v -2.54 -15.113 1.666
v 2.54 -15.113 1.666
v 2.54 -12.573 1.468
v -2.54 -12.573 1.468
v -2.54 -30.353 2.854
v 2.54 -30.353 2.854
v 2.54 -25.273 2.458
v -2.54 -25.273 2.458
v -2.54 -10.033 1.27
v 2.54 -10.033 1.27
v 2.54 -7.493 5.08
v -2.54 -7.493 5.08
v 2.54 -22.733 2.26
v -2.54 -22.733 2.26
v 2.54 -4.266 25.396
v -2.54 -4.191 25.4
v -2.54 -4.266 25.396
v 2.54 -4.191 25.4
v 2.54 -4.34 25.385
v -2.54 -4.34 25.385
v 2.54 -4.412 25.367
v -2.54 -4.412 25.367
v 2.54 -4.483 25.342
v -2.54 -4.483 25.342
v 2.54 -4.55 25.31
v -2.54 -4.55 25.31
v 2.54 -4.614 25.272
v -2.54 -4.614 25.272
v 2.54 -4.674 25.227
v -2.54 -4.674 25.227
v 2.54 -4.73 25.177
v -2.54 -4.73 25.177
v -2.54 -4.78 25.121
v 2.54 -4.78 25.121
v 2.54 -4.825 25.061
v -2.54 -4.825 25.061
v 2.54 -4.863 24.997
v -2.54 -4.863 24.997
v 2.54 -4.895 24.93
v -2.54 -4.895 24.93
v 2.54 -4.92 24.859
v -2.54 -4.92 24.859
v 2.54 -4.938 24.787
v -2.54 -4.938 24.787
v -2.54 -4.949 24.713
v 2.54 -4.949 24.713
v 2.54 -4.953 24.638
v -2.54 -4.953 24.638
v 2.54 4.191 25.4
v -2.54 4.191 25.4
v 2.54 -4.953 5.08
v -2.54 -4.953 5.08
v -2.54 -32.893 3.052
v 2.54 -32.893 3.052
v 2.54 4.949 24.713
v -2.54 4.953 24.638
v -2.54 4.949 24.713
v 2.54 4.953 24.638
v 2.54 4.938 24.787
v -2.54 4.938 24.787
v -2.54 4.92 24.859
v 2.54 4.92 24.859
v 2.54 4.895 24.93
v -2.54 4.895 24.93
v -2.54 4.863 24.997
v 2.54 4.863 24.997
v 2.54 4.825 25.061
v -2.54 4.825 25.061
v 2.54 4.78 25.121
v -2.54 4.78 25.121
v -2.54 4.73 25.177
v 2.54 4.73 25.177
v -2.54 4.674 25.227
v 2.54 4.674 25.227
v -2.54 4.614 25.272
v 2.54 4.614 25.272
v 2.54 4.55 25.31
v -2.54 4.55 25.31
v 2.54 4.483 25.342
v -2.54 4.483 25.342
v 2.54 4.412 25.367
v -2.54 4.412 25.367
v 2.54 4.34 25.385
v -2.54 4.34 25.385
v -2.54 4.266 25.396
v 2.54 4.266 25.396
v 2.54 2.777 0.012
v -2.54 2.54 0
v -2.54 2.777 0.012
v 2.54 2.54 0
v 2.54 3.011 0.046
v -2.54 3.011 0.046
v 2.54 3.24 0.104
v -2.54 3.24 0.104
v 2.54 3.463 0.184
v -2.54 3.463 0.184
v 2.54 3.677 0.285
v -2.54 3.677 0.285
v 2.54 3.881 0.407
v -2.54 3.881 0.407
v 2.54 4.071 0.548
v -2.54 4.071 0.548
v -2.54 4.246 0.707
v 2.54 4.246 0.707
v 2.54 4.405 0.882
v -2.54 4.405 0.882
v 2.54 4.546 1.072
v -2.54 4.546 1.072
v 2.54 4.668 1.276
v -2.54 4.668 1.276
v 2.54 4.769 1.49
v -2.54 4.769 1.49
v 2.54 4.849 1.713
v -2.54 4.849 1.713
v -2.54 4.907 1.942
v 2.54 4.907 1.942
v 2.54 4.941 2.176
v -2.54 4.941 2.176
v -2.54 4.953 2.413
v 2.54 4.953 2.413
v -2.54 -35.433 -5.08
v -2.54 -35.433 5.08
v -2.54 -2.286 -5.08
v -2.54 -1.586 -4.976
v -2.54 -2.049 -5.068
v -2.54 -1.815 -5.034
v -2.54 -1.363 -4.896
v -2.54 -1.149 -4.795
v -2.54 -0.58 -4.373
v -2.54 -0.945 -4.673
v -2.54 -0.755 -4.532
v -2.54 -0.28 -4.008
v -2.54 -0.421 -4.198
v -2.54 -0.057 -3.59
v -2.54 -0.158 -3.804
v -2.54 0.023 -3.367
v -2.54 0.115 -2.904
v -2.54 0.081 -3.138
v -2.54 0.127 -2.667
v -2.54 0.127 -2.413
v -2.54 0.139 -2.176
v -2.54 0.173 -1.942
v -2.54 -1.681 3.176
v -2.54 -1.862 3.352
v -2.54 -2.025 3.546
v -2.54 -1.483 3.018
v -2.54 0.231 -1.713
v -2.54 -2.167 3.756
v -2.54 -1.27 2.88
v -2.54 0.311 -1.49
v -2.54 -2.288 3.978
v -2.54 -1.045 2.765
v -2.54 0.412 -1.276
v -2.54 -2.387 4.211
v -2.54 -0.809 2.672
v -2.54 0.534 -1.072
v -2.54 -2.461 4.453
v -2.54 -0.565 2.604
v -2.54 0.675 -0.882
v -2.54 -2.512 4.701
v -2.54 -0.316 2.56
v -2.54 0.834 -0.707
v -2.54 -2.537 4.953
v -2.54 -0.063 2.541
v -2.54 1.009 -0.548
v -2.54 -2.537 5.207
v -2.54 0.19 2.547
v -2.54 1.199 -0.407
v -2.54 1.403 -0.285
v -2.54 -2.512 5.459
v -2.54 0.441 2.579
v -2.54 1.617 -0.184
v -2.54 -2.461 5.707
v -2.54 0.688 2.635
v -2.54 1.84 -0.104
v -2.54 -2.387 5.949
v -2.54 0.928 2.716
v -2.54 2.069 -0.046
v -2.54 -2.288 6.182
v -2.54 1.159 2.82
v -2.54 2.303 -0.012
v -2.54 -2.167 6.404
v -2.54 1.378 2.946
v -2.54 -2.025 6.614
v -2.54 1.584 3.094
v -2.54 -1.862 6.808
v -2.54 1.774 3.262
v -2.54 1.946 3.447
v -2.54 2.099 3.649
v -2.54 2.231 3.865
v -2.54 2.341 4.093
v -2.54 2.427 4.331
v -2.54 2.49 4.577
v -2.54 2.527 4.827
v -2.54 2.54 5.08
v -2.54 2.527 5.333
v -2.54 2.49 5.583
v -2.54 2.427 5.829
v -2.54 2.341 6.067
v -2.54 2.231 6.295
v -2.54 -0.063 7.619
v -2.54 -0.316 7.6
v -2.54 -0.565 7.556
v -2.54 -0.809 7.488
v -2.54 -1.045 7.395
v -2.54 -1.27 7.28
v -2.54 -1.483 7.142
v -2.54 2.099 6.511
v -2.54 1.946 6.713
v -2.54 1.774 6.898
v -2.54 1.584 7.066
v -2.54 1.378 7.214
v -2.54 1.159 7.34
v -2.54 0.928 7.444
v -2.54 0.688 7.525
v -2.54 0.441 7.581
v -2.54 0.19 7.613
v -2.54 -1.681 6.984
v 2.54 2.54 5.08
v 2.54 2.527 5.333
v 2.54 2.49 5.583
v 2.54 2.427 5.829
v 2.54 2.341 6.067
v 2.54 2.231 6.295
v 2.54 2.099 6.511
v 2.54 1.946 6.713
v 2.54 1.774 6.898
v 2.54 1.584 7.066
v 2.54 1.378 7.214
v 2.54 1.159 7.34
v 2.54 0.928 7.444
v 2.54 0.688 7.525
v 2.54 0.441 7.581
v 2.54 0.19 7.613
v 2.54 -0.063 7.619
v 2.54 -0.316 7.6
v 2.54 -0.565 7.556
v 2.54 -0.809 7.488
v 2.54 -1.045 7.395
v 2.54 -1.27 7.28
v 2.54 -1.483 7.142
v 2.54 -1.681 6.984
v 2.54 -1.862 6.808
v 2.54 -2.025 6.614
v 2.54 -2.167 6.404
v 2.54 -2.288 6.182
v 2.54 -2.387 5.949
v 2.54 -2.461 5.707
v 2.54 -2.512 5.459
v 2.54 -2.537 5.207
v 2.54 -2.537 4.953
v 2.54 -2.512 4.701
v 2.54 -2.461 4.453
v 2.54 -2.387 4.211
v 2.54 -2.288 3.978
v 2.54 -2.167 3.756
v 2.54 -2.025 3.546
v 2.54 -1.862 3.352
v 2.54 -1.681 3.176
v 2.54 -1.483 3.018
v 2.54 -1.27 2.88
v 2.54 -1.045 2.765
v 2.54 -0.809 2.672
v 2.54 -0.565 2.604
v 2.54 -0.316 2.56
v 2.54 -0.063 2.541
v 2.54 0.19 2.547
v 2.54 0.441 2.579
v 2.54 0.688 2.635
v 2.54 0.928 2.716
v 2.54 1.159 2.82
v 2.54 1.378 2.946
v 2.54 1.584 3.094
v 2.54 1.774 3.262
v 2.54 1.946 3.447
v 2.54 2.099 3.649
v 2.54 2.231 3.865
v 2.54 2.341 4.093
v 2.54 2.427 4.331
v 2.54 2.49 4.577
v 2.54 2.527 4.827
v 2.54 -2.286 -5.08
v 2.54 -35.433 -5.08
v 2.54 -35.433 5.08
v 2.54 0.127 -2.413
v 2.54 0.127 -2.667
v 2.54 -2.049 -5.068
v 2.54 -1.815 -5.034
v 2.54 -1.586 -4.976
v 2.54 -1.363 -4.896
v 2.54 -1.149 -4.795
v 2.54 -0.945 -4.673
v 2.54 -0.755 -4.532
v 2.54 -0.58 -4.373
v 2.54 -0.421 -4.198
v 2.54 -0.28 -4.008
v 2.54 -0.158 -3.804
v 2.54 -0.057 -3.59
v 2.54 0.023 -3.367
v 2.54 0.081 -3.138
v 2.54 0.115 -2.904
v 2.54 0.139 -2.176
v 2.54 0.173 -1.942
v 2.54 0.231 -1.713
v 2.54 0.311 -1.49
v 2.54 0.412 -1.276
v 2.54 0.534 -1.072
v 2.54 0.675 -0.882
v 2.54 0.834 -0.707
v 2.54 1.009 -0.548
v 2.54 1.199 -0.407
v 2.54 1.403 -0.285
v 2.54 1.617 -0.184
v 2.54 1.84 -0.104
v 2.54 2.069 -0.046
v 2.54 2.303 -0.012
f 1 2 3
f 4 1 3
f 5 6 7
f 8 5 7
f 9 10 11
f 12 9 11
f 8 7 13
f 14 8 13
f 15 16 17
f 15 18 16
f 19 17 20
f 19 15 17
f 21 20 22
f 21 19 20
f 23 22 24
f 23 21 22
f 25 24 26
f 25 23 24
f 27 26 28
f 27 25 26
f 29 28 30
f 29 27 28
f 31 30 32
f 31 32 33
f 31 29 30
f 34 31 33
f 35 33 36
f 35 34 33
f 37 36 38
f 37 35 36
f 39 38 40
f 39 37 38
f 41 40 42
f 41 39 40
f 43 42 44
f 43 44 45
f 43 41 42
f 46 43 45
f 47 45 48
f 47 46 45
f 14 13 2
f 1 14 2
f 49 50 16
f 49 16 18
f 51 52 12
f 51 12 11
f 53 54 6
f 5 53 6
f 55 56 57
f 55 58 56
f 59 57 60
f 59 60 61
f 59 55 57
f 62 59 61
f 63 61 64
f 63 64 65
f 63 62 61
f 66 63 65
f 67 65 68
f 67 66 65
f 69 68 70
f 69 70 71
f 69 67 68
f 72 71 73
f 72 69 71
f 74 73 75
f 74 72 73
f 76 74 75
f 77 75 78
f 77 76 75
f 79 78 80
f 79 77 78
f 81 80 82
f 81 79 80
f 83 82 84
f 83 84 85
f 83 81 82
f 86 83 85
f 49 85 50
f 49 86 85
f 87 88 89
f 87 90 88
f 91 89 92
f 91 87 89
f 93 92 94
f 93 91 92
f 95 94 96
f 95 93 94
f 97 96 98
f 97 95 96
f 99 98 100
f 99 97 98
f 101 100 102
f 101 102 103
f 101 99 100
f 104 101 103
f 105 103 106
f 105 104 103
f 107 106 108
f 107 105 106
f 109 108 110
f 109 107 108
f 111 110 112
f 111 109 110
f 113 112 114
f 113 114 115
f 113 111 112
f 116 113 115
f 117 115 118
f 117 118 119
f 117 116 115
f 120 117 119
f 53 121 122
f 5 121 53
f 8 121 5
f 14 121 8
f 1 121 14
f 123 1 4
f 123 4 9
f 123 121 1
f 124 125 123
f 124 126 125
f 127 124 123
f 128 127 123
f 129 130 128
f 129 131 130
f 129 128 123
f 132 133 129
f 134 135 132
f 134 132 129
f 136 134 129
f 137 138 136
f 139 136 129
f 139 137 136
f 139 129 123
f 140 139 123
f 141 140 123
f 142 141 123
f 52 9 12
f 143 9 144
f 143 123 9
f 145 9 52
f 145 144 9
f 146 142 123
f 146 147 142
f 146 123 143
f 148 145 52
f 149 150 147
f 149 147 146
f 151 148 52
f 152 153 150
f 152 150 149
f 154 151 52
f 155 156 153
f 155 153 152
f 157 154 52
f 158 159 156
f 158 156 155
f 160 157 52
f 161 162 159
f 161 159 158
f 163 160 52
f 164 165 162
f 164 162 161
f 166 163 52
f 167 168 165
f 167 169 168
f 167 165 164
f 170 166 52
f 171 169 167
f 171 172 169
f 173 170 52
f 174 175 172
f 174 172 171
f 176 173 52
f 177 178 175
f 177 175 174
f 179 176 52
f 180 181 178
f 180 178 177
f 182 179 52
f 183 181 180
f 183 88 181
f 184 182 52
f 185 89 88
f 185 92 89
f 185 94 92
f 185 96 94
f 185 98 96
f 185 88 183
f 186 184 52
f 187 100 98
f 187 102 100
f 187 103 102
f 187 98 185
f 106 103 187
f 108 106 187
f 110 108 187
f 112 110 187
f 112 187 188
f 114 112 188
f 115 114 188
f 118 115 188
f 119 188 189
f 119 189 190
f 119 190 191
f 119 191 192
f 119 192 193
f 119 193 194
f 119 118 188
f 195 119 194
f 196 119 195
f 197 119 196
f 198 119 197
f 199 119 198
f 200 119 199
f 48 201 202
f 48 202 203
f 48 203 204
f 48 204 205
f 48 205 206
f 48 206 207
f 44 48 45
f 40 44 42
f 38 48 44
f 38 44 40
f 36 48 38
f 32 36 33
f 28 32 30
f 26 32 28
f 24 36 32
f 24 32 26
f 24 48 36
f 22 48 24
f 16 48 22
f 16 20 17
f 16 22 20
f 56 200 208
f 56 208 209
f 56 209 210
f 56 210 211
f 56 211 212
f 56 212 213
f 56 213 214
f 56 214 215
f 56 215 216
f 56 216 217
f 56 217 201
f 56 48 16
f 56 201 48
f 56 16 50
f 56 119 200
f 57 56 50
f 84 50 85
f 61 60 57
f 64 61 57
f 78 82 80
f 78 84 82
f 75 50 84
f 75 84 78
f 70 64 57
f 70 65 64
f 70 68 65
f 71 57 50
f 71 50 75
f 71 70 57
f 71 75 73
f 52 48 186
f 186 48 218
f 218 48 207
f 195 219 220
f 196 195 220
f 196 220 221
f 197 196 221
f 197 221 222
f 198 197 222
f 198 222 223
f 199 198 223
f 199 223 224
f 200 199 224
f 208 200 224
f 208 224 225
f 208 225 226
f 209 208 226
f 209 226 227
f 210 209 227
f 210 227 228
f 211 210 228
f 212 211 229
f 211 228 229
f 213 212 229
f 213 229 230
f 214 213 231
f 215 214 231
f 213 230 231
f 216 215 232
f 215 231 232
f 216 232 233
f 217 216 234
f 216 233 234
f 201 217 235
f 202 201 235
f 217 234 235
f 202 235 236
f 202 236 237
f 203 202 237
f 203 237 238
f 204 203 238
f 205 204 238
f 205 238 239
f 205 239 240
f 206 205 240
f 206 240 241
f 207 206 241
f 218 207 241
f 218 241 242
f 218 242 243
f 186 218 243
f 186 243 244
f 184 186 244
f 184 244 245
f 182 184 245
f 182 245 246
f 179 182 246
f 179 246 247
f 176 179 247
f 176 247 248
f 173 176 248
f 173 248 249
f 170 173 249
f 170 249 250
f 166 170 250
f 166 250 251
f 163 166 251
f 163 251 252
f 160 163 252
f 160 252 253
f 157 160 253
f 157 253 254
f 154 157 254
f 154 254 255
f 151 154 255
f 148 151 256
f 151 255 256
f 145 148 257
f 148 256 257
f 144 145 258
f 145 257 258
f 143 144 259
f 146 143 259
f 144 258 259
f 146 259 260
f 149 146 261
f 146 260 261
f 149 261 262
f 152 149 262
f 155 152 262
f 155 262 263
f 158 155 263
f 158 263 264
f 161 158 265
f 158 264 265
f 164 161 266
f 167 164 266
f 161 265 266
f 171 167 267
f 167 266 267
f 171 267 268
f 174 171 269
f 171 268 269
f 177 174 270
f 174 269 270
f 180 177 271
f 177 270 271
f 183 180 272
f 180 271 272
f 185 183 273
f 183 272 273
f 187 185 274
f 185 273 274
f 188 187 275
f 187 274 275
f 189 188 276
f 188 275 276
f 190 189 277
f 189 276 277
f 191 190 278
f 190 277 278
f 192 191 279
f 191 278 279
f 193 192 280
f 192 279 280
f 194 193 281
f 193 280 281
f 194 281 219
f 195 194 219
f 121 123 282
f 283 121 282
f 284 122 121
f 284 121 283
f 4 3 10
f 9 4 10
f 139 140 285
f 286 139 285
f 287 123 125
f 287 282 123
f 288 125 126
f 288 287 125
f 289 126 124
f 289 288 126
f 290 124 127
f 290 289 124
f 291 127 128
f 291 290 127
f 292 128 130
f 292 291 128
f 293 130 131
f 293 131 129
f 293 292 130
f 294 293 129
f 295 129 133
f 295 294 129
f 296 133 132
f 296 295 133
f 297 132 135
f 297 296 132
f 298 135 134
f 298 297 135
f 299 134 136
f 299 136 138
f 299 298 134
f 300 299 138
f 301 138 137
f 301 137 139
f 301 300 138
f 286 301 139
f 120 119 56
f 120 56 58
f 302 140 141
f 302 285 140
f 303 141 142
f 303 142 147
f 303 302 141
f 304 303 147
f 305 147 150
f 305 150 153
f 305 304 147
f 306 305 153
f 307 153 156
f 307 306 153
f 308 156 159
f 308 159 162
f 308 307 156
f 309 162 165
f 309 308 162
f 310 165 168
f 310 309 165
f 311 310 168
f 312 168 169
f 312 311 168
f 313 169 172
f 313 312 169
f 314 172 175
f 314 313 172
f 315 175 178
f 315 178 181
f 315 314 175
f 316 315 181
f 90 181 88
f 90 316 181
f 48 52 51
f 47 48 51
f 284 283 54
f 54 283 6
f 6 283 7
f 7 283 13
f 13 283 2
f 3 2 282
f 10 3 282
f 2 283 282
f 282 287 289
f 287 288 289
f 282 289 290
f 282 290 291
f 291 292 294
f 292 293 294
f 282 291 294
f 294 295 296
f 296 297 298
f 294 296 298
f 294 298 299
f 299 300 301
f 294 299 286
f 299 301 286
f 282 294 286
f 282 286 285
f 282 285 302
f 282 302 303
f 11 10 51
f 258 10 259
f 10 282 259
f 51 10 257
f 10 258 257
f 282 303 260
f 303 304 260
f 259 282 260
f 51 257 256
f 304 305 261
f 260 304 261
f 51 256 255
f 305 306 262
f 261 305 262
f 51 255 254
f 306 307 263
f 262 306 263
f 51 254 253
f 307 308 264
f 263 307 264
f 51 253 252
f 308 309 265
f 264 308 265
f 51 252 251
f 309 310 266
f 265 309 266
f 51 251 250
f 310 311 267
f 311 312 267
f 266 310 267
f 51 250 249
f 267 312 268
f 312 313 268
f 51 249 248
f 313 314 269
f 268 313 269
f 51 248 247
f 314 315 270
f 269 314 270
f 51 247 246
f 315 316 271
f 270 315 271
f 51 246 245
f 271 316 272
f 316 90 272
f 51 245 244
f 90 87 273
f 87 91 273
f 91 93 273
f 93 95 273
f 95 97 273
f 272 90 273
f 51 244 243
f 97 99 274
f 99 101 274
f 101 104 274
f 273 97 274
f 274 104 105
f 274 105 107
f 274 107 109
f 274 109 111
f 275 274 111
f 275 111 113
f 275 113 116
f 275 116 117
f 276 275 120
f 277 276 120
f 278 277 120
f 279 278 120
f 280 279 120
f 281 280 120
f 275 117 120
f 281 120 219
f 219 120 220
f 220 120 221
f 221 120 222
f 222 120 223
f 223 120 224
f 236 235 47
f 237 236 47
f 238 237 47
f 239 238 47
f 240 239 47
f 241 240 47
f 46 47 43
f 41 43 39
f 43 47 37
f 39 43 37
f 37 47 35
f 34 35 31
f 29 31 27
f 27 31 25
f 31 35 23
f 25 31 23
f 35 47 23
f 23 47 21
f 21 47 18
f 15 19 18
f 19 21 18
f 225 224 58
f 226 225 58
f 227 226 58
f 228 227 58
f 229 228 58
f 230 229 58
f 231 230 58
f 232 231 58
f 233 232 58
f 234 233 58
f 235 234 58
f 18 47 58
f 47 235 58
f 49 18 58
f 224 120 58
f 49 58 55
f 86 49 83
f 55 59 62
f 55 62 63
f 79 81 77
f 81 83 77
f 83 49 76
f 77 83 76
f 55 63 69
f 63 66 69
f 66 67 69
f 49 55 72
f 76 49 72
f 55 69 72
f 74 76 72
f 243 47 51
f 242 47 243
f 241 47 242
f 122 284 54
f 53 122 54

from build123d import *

# Parameters (mm, degrees)
F0_W      = 5.08
F0_H      = 9.906
F1_DEPTH  = 25.4
F2_W      = 5.08
F2_H      = 5.08
F3_DEPTH  = 5.08
F4_W      = 5.08
F4_H      = 5.08
F5_DEPTH  = 5.08
F6_DEPTH  = 5.08
F7_DEPTH  = 25.4
F9_DEPTH  = 5.081
F10_R     = 2.41299
F11_R     = 2.54
F12_DEPTH = 5.081
F13_R     = 0.762


# Not quite as in the source:
# - a fillet or chamfer is up to 0.001 mm smaller than in the source, because OpenCascade refuses the exact size


with BuildPart() as f1:
    # F0 (on Top) → F1 (new body)
    with BuildSketch(Plane.XY):
        Rectangle(F0_W, F0_H)
    extrude(amount=F1_DEPTH)

    # F2 (on face) → F3 (join)
    with BuildSketch(Plane.XZ.offset(4.953)):
        with Locations((0, 2.54)):
            Rectangle(F2_W, F2_H)
    extrude(amount=F3_DEPTH)

    # F4 (on face) → F5 (join)
    with BuildSketch(Plane(origin=(0, 0, 0), x_dir=(1, 0, 0), z_dir=(0, 0, -1))):
        with Locations((0, 7.493)):
            Rectangle(F4_W, F4_H)
    extrude(amount=F5_DEPTH)

    # F6 (add): a face of the model
    f6_faces = [f1.faces().sort_by_distance(p)[0] for p in [
        (0, -4.953, -2.54),
    ]]
    extrude(f6_faces, amount=F6_DEPTH)

    # F7 (add): a face of the model
    f7_faces = [f1.faces().sort_by_distance(p)[0] for p in [
        (0, -10.033, 0),
    ]]
    extrude(f7_faces, amount=F7_DEPTH)

    # F8 (on face) → F9 (cut, through all)
    with BuildSketch(Plane.YZ.offset(2.54)):
        Polygon((-7.493, 5.08), (-10.033, 5.08), (-10.033, 1.27), align=None)
        Polygon((-10.033, 5.08), (-12.573, 5.08), (-12.573, 1.468039654), (-10.033, 1.27), align=None)
        Polygon((-12.573, 5.08), (-15.113, 5.08), (-15.113, 1.6660793079), (-12.573, 1.468039654), align=None)
        Polygon((-15.113, 5.08), (-17.653, 5.08), (-17.653, 1.8641189619), (-15.113, 1.6660793079), align=None)
        Polygon((-20.193, 5.08), (-22.733, 5.08), (-22.733, 2.2601982699), (-20.193, 2.0621586159), align=None)
        Polygon((-17.653, 5.08), (-20.193, 5.08), (-20.193, 2.0621586159), (-17.653, 1.8641189619), align=None)
        Polygon((-22.733, 5.08), (-25.273, 5.08), (-25.273, 2.4582379238), (-22.733, 2.2601982699), align=None)
        Polygon((-25.273, 5.08), (-27.813, 5.08), (-27.813, 2.6562775778), (-25.273, 2.4582379238), align=None)
        Polygon((-27.813, 5.08), (-30.353, 5.08), (-30.353, 2.8543172318), (-27.813, 2.6562775778), align=None)
        Polygon((-30.353, 5.08), (-32.893, 5.08), (-32.893, 3.0523568857), (-30.353, 2.8543172318), align=None)
        Polygon((-32.893, 5.08), (-35.433, 5.08), (-32.893, 3.0523568857), align=None)
    extrude(amount=-F9_DEPTH, mode=Mode.SUBTRACT)

    # F10 (radius 2.413 in the source; OpenCascade refuses exactly that, so slightly less here)
    f10_edges = [f1.edges().sort_by_distance(p)[0] for p in [
        (0, 0.127, -5.08),
        (0, 0.127, 0),
        (0, 4.953, 0),
    ]]
    fillet(f10_edges, radius=F10_R)

    # F11 (on face) → F12 (cut, through all)
    with BuildSketch(Plane.YZ.offset(2.54)):
        with Locations((0, 5.08)):
            Circle(F11_R)
    extrude(amount=-F12_DEPTH, mode=Mode.SUBTRACT)

    # F13
    f13_edges = [f1.edges().sort_by_distance(p)[0] for p in [
        (0, 4.953, 25.4),
        (0, -4.953, 25.4),
    ]]
    fillet(f13_edges, radius=F13_R)


solid = f1.part
